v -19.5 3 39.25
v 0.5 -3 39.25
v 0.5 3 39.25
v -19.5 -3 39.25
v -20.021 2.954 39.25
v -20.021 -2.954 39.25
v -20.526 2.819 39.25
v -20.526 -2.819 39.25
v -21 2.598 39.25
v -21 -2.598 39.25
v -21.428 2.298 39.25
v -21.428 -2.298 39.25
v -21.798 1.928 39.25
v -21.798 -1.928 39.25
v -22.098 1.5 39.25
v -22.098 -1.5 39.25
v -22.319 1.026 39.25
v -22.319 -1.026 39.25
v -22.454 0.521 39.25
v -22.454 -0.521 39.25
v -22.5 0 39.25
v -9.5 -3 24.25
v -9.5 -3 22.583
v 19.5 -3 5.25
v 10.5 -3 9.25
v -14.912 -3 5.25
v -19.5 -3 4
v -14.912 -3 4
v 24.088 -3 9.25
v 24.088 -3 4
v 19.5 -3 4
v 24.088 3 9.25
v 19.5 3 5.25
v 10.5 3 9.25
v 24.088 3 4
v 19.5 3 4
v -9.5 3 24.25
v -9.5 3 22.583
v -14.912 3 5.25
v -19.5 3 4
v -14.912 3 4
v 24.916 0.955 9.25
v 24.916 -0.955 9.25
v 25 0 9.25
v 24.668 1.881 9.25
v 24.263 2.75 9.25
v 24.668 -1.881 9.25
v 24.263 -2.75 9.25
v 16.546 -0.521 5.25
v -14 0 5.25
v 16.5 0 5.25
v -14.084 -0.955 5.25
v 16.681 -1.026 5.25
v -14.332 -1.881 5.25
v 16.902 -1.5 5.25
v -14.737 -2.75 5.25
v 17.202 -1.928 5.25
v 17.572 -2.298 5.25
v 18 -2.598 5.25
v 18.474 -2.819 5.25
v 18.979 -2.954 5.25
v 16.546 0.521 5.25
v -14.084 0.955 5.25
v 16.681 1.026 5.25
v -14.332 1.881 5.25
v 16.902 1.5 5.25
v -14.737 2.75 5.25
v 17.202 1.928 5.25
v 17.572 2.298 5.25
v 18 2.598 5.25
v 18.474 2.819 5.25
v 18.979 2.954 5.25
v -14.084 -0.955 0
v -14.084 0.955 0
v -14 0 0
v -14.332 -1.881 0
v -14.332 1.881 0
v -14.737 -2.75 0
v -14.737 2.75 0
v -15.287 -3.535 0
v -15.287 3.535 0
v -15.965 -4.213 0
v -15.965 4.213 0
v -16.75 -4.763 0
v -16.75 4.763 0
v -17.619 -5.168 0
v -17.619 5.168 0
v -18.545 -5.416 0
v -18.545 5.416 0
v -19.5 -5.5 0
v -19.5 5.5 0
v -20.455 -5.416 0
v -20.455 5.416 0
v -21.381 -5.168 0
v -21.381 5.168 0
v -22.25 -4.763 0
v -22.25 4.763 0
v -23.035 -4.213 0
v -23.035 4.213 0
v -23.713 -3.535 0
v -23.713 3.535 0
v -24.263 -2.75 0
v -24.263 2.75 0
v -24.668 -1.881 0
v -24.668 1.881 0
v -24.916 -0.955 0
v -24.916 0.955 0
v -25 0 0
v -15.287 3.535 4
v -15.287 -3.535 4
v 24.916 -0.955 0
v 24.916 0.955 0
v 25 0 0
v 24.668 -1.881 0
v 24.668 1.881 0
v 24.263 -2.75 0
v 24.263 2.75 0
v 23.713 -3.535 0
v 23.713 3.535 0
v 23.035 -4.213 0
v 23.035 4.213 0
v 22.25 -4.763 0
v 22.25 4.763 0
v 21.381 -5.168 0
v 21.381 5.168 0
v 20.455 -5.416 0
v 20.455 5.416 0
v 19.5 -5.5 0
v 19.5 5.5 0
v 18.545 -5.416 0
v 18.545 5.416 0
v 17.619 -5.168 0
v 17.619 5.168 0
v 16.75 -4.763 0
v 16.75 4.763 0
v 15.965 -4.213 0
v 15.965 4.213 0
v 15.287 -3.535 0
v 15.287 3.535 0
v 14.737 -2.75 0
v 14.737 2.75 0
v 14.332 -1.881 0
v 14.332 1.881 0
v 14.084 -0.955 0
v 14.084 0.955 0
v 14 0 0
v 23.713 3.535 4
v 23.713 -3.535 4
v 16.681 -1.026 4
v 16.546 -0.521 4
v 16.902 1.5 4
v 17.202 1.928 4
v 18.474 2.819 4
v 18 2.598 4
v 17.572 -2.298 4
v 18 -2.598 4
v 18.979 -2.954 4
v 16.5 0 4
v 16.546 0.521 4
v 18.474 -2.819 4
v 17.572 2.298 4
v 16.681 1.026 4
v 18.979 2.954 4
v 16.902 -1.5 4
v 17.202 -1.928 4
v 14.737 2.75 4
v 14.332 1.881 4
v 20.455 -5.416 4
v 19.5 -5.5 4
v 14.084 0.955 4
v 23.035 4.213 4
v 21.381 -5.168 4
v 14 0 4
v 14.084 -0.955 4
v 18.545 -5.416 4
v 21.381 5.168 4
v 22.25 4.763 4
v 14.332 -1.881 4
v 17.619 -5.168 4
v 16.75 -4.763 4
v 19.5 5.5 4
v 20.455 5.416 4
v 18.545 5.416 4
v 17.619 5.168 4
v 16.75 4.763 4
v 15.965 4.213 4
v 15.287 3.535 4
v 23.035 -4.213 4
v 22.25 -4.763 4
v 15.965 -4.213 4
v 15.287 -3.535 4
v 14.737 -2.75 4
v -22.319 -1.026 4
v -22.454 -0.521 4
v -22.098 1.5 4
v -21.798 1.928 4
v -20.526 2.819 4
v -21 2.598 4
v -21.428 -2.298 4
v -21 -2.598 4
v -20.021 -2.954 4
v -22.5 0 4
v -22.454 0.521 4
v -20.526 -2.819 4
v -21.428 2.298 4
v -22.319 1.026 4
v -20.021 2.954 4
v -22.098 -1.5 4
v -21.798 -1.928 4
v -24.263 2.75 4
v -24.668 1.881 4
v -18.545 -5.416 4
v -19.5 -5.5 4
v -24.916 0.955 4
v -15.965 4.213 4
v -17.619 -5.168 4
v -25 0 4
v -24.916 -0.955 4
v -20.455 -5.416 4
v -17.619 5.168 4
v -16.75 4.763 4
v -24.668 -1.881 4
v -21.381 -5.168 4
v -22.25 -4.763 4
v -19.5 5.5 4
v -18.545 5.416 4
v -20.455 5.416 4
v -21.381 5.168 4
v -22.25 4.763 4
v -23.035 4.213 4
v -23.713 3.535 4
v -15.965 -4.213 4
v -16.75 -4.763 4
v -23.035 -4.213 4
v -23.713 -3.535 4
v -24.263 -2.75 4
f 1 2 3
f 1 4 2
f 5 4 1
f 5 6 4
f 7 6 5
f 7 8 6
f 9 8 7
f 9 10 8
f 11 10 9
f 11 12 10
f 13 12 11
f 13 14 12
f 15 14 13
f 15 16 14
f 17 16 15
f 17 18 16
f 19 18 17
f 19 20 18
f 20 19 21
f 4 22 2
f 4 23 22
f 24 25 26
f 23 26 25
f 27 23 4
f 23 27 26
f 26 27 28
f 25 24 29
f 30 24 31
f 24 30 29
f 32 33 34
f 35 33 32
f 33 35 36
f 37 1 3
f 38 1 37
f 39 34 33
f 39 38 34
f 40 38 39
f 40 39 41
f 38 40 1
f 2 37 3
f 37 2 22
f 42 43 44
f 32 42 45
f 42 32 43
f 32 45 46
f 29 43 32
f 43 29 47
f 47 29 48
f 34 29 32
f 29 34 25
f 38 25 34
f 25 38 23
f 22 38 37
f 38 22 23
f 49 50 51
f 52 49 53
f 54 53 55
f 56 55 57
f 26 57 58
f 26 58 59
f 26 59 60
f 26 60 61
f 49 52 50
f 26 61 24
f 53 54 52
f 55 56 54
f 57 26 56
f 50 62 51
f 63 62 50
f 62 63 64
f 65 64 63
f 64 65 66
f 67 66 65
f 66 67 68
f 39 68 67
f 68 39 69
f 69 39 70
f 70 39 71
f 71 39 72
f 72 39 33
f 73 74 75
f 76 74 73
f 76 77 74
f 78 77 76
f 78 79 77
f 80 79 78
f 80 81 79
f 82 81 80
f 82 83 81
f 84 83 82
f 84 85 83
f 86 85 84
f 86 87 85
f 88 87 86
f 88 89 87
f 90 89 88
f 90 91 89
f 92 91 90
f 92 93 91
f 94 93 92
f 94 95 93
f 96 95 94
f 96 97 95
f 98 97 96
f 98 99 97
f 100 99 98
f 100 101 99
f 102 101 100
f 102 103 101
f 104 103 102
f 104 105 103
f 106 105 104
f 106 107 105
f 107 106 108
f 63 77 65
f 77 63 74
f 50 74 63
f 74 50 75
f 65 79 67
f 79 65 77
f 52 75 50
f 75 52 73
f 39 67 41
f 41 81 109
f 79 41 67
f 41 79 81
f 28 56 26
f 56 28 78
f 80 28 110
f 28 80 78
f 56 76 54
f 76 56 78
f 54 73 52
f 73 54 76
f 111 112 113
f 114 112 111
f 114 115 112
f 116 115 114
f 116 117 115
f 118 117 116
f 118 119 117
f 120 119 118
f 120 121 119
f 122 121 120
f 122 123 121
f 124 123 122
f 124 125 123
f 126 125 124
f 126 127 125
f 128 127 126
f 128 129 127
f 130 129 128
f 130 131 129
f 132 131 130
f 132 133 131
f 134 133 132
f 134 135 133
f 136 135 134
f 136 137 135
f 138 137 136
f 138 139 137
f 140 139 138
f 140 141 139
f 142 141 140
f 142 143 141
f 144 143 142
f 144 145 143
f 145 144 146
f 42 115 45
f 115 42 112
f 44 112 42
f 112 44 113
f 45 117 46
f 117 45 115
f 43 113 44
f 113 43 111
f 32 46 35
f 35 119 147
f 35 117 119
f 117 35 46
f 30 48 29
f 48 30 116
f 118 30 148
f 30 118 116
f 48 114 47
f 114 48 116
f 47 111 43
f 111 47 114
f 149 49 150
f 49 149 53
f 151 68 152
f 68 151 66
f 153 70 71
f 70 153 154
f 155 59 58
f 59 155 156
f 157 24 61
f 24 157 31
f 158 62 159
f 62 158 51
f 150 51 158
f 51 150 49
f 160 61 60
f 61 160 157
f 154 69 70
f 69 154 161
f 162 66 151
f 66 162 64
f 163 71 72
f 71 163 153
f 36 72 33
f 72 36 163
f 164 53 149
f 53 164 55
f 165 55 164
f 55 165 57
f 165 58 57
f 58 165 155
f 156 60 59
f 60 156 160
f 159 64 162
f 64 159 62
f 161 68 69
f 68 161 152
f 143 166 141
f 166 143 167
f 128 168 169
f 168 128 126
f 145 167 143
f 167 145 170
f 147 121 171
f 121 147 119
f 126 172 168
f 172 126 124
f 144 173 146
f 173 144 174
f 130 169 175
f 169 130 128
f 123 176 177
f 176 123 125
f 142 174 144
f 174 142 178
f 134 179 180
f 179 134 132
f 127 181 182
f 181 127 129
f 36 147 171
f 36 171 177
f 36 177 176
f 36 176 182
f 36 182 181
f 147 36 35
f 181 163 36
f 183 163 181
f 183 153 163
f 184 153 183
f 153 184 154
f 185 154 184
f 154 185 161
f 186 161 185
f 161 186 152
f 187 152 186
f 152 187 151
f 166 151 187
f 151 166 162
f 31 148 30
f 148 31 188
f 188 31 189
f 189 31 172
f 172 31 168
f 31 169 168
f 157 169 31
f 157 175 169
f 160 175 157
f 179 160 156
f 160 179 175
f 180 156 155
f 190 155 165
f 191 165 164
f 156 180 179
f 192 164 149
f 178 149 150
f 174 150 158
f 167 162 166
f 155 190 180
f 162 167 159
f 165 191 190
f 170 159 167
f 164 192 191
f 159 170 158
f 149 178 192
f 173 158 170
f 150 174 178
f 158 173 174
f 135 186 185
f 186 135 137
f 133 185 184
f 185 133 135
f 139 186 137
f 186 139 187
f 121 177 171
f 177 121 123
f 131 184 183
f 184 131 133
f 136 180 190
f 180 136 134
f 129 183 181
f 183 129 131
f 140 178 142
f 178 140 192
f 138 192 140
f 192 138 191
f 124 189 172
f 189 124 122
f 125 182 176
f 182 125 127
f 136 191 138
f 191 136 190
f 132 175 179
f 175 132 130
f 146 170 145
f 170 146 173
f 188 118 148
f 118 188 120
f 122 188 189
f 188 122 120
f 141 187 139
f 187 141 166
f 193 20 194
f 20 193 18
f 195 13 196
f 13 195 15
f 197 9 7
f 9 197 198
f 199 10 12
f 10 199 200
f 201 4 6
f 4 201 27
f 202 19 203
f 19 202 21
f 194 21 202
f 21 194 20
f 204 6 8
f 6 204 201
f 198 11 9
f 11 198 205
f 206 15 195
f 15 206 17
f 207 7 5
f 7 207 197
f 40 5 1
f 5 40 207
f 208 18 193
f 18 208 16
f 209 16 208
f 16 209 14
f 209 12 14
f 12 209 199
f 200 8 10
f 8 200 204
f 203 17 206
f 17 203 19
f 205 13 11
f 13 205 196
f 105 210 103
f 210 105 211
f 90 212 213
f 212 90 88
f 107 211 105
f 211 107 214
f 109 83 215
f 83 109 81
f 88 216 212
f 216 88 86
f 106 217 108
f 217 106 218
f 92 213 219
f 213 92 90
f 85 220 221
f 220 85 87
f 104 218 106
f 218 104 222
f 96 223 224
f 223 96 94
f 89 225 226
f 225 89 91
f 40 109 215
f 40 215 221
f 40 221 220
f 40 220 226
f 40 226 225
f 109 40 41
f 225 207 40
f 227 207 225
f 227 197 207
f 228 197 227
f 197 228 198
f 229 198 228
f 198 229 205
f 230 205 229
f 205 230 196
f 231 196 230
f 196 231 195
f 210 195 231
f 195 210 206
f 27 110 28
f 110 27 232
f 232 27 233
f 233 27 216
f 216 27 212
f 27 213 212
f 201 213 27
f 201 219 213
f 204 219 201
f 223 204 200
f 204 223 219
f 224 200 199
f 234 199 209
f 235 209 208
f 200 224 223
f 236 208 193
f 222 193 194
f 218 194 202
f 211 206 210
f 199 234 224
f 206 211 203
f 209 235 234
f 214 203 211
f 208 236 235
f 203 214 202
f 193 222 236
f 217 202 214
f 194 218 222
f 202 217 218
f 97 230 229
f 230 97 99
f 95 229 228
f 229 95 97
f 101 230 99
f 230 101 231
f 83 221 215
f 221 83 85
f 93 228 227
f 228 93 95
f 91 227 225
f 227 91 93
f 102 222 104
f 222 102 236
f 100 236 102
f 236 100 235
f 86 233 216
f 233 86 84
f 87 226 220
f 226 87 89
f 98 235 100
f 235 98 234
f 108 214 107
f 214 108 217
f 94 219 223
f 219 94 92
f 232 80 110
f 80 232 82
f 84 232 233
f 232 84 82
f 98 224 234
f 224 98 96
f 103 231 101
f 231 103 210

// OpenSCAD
// for precise messurement points see the supplied pictures

//diameter of the large round part of the key hole,make smaller then real (for clearaces)
key_big = 11;
//diameter of the small offshoot from the main key cylinder,make smaller then real (for clearaces)
key_small = 6;

//distance from one key hole to the same point in the next key hole, make slightly bigger then real (for clearaces)
key_spacing = 39;
//thickness of the material the key holes are kut out of, make slightly bigger then real (for clearaces)
key_thickness = 1.25;

//the distance the hook extends from the support, poke should be bigger then hook
poke = 30;
//total hight if hook tip, hook width will = half this, hook should be smaller then poke
hook = 20;
//thickness of lugs and support bar
support_thickness = 4;


//turning the numbers into what object needs

hookStart = support_thickness*2+key_thickness;
angle = atan ( hook / poke);
hype = poke + hook;
KBR = key_big/2;
KSR = key_small/2;
 
module wedge()  {
	translate([0,-key_small,0]) difference() {
		cube([poke,key_small,hook]);
		rotate(a=[0,-angle,0])translate([0,-1,0])cube([hype,key_small+2,hook]);
	}	}

module betterjoints() {
	intersection(){
		translate([0,-KSR,0])cube([key_spacing,key_small,support_thickness*2+key_thickness]);
		cylinder(h= support_thickness*2+key_thickness ,r1 = KBR , r2 = KBR,$fn=36);
	}
}

translate([-KBR- key_spacing/2,-KBR,0]) {		//to centre item on the build platform


translate([KBR,KBR - KSR,hookStart]) {		//hook and support bar making section
	cube([hook/2,key_small,poke]);
	rotate(a=[0,270,180]) wedge();
	translate([poke,0,0])rotate(a=[0,0,180]) wedge();
	translate([0,0,-support_thickness]) cube([key_spacing,key_small,support_thickness]);
	}

translate([KBR,KBR,0]) {								//post 1
	cylinder(h= hookStart + poke, r1 = KSR ,r2 = KSR,$fn=36);
	cylinder(h= support_thickness ,r1 = KBR , r2 = KBR,$fn=36);
	betterjoints();
	translate([key_spacing,0,0]){						//post 2
		cylinder(h= hookStart, r1 = KSR ,r2 = KSR,$fn=36);
		cylinder(h= support_thickness ,r1 = KBR , r2 = KBR,$fn=36);
		betterjoints();
		}
	}
}
